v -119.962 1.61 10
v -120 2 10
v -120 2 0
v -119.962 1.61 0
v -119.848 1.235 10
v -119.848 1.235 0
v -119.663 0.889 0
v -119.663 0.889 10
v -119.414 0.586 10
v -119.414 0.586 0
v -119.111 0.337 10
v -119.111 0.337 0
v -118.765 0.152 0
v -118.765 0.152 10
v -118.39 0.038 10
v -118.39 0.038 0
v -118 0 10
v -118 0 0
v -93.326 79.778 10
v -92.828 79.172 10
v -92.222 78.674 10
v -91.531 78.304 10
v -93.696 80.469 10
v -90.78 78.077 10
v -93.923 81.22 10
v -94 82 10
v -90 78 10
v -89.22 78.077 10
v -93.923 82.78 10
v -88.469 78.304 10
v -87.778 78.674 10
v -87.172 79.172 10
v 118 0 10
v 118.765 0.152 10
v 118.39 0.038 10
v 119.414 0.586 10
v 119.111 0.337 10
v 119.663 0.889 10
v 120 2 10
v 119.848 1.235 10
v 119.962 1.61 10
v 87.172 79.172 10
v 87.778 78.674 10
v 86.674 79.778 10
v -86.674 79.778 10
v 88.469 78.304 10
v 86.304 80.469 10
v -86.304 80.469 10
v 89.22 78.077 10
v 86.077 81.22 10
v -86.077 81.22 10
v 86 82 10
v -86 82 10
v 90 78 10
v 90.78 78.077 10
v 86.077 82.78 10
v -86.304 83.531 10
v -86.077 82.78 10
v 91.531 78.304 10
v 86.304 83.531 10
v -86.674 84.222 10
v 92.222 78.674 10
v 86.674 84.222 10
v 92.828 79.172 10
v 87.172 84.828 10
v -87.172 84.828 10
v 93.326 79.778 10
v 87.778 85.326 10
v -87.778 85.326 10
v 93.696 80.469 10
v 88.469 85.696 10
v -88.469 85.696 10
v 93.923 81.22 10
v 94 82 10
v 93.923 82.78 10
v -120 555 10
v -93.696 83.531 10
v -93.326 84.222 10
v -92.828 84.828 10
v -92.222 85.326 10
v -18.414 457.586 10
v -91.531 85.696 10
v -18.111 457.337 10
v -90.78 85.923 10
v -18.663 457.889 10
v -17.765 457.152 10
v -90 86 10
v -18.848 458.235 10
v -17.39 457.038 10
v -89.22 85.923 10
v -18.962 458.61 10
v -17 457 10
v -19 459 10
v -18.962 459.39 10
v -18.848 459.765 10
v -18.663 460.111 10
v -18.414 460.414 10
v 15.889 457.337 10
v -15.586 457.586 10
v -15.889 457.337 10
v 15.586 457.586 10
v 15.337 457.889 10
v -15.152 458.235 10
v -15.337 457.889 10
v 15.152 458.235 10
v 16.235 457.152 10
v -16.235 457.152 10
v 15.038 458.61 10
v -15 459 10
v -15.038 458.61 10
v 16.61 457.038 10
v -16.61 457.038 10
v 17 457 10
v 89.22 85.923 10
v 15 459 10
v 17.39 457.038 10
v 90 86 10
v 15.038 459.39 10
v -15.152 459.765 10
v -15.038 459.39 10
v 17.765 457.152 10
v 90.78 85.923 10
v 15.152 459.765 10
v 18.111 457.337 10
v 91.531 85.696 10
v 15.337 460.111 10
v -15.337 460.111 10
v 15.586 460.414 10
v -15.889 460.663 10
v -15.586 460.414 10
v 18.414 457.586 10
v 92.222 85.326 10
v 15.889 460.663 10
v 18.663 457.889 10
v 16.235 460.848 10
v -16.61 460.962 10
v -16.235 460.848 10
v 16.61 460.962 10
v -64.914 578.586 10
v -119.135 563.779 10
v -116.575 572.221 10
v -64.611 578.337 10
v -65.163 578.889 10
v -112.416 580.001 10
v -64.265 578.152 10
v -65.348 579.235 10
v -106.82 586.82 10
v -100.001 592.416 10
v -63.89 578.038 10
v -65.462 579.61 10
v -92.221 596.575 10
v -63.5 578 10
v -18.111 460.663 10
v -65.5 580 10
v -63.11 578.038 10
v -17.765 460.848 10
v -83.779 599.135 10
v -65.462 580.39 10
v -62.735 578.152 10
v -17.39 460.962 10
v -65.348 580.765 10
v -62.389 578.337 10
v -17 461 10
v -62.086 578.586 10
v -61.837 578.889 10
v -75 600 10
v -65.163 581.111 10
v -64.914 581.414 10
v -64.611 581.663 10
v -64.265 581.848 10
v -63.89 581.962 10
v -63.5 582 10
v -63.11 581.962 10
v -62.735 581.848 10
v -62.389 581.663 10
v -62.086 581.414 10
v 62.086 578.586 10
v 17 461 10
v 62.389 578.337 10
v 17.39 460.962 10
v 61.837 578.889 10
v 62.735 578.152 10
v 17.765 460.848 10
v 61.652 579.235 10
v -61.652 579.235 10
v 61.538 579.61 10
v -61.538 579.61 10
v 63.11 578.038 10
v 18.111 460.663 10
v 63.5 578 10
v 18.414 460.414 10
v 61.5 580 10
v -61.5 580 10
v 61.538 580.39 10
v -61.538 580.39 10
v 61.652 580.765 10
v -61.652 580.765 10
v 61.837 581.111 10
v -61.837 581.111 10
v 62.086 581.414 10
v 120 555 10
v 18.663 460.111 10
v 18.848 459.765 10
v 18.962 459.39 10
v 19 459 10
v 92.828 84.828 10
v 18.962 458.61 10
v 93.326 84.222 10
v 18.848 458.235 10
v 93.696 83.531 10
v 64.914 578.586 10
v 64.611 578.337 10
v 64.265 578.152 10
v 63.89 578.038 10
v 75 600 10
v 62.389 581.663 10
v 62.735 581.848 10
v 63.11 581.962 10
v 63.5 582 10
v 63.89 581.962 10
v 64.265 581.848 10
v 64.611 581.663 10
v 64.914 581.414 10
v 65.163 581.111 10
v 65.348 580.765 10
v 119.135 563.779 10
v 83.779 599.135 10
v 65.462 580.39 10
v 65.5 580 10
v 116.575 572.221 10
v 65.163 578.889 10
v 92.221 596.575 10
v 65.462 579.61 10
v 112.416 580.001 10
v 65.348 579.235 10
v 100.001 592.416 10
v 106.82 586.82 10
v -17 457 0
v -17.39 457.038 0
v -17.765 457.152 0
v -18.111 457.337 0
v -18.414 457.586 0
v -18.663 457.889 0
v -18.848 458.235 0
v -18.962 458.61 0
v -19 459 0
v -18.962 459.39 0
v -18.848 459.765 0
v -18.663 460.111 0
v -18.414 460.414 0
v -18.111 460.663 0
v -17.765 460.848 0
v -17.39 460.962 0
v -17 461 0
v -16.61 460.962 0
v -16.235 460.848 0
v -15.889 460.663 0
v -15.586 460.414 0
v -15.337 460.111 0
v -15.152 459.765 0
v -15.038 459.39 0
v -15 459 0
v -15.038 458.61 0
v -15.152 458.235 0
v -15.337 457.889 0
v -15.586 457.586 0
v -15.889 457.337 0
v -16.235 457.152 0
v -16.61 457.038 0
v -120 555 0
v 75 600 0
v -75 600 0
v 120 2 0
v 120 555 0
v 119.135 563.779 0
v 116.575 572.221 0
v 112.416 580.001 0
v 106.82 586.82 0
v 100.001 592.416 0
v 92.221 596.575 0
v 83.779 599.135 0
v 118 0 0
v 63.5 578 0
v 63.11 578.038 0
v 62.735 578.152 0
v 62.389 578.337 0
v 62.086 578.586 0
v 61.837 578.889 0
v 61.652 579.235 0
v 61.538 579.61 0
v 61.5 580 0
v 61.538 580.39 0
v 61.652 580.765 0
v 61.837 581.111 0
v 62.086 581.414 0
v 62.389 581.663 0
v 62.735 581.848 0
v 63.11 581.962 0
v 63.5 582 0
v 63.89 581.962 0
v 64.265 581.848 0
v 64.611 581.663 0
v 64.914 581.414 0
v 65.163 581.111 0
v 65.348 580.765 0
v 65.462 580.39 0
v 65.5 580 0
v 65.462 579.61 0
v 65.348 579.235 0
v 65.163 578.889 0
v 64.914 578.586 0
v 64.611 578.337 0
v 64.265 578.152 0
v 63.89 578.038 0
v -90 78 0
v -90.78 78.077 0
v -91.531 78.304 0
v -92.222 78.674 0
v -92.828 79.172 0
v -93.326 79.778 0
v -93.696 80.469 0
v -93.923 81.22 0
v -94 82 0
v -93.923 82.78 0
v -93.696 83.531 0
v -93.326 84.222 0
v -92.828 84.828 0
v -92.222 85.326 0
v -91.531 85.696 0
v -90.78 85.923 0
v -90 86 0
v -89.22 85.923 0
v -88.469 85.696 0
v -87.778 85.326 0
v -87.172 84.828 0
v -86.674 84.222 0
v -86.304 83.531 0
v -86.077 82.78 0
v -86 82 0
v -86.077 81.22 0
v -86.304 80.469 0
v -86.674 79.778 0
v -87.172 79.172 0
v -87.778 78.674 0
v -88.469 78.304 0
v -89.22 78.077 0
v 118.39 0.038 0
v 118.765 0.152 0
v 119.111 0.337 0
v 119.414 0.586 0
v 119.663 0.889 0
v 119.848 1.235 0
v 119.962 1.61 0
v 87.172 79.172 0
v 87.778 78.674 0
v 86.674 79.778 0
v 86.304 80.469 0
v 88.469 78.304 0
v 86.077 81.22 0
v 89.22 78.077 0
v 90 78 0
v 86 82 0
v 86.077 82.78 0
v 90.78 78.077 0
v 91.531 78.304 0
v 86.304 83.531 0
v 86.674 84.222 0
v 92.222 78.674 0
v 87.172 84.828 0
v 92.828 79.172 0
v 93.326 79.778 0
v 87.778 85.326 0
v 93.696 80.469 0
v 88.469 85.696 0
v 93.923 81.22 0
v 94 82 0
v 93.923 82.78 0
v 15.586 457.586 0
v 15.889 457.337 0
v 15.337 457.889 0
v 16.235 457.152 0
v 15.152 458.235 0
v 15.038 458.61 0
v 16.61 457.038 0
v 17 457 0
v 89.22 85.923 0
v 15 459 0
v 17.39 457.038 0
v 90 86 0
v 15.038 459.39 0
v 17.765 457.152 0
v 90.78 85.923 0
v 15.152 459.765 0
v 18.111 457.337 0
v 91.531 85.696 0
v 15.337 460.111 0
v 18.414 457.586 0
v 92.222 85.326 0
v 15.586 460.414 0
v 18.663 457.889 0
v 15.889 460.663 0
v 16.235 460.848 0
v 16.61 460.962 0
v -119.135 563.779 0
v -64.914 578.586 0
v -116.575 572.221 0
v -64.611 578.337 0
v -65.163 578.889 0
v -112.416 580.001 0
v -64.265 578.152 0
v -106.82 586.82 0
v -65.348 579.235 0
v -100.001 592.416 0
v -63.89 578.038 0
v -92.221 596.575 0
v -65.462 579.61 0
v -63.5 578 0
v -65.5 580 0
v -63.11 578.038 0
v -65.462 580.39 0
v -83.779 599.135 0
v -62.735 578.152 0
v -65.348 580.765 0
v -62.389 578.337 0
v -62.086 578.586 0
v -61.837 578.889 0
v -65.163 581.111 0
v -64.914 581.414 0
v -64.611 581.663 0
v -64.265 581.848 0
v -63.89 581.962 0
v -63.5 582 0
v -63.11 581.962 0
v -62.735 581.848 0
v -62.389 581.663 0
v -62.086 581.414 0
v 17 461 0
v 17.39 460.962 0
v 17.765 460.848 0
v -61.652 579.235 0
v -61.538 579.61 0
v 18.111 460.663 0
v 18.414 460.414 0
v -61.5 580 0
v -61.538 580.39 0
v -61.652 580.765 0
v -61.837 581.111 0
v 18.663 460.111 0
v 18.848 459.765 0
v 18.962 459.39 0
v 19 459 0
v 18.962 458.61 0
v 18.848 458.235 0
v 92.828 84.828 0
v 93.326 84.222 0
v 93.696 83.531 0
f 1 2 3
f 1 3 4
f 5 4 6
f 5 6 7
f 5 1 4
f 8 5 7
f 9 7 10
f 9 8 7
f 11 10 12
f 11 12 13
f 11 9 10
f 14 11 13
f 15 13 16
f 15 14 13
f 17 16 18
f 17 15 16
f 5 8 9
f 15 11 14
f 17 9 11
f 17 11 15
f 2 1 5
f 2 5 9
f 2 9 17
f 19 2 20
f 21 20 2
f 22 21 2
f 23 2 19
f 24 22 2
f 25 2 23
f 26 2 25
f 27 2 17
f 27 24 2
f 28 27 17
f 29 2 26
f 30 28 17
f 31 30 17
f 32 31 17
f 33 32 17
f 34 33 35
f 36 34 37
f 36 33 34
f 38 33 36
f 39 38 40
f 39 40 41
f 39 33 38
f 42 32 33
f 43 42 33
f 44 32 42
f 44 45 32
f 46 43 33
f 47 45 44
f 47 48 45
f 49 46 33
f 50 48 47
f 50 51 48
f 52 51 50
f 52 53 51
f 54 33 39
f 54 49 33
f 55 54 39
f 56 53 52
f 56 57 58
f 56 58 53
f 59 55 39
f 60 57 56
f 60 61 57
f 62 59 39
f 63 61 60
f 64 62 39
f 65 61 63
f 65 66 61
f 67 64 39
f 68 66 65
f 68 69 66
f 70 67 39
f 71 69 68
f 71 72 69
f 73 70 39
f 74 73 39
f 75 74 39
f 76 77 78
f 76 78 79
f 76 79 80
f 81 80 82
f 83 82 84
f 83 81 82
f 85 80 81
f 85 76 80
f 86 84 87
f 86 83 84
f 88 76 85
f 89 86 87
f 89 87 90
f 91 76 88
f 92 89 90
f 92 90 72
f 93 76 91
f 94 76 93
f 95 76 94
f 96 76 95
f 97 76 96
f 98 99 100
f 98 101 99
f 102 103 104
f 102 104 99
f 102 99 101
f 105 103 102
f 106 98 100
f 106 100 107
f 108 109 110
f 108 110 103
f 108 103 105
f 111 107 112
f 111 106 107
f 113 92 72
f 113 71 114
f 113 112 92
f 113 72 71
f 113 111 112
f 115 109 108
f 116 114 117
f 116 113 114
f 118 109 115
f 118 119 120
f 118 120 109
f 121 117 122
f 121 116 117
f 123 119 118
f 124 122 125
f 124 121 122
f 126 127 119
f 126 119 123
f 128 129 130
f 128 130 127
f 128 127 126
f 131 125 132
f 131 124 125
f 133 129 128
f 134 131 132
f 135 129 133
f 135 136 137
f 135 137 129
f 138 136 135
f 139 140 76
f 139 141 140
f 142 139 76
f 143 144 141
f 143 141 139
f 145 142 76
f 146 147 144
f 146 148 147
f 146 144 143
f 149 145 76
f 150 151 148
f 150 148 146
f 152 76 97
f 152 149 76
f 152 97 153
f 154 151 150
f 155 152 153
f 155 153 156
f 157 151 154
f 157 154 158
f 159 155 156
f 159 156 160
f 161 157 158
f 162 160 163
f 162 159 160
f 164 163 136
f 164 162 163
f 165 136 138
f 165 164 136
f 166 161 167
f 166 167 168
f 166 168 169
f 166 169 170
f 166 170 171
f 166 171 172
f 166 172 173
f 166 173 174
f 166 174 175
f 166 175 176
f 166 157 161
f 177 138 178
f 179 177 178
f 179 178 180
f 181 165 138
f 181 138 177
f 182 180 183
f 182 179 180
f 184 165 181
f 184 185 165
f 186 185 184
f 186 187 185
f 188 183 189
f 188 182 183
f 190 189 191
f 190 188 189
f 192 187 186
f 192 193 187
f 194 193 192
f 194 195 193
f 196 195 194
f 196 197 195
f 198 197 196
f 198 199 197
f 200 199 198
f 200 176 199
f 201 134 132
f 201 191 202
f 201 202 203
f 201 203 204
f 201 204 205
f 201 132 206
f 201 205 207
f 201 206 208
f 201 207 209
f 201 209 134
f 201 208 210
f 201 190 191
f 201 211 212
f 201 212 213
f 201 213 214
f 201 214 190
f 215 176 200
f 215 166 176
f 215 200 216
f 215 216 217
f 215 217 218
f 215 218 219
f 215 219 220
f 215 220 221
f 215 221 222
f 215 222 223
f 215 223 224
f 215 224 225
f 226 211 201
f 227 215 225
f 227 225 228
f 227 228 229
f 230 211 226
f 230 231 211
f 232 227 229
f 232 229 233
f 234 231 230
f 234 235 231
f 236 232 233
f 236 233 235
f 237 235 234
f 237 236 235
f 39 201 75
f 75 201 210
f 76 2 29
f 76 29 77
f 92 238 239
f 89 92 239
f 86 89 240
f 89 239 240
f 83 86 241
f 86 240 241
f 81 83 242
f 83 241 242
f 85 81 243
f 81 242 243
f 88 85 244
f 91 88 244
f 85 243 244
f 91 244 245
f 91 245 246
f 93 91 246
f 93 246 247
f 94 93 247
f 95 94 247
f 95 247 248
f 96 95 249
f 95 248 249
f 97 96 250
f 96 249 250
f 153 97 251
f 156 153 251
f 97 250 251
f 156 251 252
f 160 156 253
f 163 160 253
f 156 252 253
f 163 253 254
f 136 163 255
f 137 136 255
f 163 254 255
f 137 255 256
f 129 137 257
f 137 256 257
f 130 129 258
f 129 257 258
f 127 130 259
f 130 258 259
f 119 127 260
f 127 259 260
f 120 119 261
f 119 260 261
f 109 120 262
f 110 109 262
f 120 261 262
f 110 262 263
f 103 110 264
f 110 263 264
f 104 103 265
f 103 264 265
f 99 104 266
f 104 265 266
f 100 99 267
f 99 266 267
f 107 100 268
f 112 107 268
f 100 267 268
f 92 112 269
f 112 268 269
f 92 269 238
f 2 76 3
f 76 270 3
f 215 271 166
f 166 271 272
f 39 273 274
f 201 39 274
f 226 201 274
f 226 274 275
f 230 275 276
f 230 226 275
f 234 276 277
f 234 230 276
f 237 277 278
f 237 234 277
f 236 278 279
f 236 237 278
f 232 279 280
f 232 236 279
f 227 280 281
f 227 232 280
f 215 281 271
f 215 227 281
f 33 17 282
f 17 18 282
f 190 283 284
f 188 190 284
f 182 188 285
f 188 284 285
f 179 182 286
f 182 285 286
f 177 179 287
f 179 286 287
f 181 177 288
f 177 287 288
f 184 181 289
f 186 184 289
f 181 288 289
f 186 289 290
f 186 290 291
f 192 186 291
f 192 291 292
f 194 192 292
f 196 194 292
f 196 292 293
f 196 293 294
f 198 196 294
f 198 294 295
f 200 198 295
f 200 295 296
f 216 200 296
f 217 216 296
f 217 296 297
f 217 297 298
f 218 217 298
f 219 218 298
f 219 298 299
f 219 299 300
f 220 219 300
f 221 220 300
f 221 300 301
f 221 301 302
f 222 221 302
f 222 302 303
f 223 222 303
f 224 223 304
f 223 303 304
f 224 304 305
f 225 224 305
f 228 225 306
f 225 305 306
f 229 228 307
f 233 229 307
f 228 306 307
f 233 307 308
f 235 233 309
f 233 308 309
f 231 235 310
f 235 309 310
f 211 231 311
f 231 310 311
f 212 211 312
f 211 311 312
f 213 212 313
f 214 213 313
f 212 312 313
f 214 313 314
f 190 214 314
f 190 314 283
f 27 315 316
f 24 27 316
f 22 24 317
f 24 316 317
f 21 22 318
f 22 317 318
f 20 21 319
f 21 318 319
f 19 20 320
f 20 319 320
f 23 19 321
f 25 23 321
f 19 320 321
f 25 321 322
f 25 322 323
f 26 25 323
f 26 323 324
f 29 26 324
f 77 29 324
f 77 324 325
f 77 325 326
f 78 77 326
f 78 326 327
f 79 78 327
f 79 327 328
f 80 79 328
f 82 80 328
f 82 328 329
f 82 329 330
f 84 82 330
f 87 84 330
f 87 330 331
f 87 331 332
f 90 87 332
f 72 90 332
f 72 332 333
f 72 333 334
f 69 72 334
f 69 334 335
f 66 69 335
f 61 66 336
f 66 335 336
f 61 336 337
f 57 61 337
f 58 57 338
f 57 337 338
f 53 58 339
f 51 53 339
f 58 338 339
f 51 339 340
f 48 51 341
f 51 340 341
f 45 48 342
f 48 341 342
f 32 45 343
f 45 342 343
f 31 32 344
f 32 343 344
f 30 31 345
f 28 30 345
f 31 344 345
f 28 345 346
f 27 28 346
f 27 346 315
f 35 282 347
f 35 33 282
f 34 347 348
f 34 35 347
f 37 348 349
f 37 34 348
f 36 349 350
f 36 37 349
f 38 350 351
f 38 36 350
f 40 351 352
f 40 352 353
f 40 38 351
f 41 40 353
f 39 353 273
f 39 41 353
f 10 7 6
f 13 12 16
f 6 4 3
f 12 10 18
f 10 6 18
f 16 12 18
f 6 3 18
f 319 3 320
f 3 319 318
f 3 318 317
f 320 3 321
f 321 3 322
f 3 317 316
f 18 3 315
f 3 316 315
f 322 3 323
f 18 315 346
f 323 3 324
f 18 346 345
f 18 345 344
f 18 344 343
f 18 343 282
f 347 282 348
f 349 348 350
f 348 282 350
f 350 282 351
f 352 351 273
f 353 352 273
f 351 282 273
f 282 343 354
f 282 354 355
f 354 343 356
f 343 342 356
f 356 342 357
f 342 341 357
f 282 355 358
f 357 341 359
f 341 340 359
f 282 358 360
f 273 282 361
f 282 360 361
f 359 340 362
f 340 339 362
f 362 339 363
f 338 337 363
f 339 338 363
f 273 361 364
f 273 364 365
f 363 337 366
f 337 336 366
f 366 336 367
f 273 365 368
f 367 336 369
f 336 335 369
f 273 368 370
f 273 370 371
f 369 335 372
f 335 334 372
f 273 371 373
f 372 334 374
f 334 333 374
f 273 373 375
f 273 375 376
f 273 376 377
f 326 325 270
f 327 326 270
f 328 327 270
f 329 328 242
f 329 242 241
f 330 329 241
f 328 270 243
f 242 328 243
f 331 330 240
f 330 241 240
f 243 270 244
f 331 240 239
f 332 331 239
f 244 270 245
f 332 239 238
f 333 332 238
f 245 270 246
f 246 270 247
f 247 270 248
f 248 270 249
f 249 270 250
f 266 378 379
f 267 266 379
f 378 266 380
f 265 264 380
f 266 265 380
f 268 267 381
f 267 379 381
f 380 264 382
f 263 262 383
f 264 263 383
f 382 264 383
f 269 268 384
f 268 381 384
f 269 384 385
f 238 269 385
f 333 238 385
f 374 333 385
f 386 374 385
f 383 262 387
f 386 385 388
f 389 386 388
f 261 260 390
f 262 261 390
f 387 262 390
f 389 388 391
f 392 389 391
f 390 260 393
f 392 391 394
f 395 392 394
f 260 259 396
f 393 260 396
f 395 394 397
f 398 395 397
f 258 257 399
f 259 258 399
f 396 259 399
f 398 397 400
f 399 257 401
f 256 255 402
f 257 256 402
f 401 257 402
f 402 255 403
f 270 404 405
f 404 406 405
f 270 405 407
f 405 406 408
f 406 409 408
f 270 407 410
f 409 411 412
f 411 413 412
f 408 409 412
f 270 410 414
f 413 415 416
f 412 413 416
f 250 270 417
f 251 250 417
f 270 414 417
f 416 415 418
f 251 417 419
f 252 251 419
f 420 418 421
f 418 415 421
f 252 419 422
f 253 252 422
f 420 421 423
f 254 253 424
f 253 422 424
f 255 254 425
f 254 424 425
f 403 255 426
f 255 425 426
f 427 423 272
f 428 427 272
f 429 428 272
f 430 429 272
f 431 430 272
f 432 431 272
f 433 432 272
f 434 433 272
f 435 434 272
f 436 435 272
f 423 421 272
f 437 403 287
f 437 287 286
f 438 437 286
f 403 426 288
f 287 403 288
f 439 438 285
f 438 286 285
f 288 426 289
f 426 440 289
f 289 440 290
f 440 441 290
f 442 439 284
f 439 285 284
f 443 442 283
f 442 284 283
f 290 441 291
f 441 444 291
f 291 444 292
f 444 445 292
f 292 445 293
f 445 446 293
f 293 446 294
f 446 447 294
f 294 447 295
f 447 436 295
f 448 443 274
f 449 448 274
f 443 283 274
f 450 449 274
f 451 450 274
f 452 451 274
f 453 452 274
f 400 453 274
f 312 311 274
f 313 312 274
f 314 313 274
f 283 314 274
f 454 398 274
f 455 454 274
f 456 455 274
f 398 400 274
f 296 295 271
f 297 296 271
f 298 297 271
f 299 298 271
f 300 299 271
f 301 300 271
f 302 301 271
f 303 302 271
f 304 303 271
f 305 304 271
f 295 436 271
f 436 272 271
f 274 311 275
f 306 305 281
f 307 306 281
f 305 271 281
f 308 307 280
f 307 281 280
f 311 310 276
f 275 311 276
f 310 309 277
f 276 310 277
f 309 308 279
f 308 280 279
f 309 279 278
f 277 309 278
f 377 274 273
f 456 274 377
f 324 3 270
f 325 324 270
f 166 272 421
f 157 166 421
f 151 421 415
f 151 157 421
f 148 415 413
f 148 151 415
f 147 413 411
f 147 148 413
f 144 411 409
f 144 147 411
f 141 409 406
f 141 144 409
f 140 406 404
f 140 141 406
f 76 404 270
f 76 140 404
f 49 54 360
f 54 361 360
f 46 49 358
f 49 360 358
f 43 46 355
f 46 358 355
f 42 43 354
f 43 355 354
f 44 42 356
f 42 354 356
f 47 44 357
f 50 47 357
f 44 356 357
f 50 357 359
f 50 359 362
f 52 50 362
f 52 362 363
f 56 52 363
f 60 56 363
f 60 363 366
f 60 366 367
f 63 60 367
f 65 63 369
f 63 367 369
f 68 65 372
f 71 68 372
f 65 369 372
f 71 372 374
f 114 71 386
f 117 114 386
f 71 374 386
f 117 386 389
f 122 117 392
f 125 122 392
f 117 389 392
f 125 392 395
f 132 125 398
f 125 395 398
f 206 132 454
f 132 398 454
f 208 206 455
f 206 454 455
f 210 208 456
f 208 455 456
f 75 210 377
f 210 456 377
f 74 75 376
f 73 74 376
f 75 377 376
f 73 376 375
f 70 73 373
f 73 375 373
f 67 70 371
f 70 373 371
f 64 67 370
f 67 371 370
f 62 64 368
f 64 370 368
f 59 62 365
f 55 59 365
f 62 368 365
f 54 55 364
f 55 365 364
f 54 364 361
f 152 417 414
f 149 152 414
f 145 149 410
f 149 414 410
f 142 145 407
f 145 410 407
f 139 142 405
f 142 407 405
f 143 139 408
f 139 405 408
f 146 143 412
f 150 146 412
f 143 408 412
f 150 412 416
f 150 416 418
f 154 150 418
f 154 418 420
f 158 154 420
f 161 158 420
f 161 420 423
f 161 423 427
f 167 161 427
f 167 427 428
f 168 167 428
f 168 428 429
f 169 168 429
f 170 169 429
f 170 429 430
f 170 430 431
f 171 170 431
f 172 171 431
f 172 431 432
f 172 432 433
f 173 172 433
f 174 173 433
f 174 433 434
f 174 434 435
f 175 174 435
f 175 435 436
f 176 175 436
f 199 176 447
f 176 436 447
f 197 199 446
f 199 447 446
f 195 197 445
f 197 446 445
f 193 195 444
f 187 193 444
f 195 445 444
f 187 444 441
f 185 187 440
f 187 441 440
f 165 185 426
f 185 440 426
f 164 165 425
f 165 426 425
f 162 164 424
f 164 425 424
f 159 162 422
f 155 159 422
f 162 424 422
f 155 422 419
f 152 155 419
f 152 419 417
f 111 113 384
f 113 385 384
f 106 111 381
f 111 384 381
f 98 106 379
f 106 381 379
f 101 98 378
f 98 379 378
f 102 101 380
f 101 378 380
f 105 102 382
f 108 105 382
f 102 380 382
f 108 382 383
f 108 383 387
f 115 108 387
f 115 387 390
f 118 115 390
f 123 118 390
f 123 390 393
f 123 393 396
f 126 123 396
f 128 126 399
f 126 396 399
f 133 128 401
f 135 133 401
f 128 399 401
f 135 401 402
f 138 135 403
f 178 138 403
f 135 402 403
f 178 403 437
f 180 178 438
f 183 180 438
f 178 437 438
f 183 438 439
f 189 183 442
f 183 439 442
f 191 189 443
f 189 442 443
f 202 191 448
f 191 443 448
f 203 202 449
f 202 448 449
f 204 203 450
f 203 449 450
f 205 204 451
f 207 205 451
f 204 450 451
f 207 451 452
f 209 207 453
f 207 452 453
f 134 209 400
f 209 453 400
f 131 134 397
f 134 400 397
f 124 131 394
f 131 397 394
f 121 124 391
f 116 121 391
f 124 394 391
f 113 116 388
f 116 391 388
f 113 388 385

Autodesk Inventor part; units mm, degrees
ref_plane "YZ Plane" through (0, 0, 0) normal (1, 0, 0) x (0, 1, 0)
ref_plane "XZ Plane" through (0, 0, 0) normal (0, 1, 0) x (-1, 0, 0)
ref_plane "XY Plane" through (0, 0, 0) normal (0, 0, 1) x (1, 0, 0)
sketch "Sketch1" plane through (0, 0, 0) normal (0, 0, 1) x (1, 0, 0)
  line L0 (-120, 0) -> (120, 0)
  line L1 (120, 0) -> (120, 600)
  line L2 (120, 600) -> (-120, 600)
  line L3 (-120, 600) -> (-120, 0)
  point P0 (0, 0)
  dimension "d0" = 600
  dimension "d1" = 240
  dimension "d2" = 120
extrude "Extrusion1" add sketch "Sketch1" along normal blind 10
fillet "Fillet1" radius 45 2 edges at (120, 600, 5) (-120, 600, 5)
sketch "Sketch2" plane through (0, 0, 10) normal (0, 0, 1) x (1, 0, 0)
  line L0 (-120, 555) -> (-120, 0) projected
  line L1 (120, 0) -> (120, 555) projected
  line L2 (-120, 0) -> (120, 0) projected
  point P0 (0, 0)
  point P1 (-90, 82)
  point P2 (90, 82)
  dimension "d8" = 82
  dimension "d9" = 82
  dimension "d17" = 90
  dimension "d18" = 90
hole "Hole1" at (-90, 82, 10) at (90, 82, 10) direction (0, 0, -1) diameter 8 depth 60
sketch "Sketch3" plane through (0, 0, 10) normal (0, 0, 1) x (1, 0, 0)
  line L0 (75, 600) -> (-75, 600) projected
  point P0 (0, 0)
  point P1 (-63.5, 580)
  point P2 (63.5, 580)
  point P3 (-17, 459)
  point P4 (17, 459)
  dimension "d19" = 17
  dimension "d20" = 17
  dimension "d21" = 63.5
  dimension "d22" = 63.5
  dimension "d23" = 20
  dimension "d24" = 20
  dimension "d25" = 121
  dimension "d26" = 121
hole "Hole2" at (17, 459, 10) at (-17, 459, 10) at (63.5, 580, 10) at (-63.5, 580, 10) direction (0, 0, -1) diameter 4 end through all
fillet "Fillet2" radius 2 2 edges at (-120, 0, 5) (120, 0, 5)
equation "\"d0\" = partHeight"
equation "\"d1\" = partWidth"
equation "\"d2\" = 0.5 * partWidth"
equation "\"d3\" = thickness"
equation "\"d8\" = holeHeight"
equation "\"d9\" = holeHeight"
equation "\"d17\" = 0.5 * ribThickness + 0.5 * ribSpacing"
equation "\"d18\" = 0.5 * ribThickness + 0.5 * ribSpacing"
equation "\"d19\" = 0.5 * lowerHoleSpacing"
equation "\"d20\" = 0.5 * lowerHoleSpacing"
equation "\"d21\" = 0.5 * upperHoleSpacing"
equation "\"d22\" = 0.5 * upperHoleSpacing"
equation "\"d24\" = d23"
equation "\"d26\" = d25"
equation "\"d27\" = mountHoleDiameter"
equation "\"partWidth\" = 240"
equation "\"partHeight\" = 600"
equation "\"thickness\" = 10"
equation "\"holeHeight\" = 82"
equation "\"upperHoleSpacing\" = 127"
equation "\"lowerHoleSpacing\" = 34"
equation "\"mountHoleDiameter\" = 4"
equation "\"ribThickness\" = 20"
equation "\"ribSpacing\" = 160"
properties part number "mountPlate"
